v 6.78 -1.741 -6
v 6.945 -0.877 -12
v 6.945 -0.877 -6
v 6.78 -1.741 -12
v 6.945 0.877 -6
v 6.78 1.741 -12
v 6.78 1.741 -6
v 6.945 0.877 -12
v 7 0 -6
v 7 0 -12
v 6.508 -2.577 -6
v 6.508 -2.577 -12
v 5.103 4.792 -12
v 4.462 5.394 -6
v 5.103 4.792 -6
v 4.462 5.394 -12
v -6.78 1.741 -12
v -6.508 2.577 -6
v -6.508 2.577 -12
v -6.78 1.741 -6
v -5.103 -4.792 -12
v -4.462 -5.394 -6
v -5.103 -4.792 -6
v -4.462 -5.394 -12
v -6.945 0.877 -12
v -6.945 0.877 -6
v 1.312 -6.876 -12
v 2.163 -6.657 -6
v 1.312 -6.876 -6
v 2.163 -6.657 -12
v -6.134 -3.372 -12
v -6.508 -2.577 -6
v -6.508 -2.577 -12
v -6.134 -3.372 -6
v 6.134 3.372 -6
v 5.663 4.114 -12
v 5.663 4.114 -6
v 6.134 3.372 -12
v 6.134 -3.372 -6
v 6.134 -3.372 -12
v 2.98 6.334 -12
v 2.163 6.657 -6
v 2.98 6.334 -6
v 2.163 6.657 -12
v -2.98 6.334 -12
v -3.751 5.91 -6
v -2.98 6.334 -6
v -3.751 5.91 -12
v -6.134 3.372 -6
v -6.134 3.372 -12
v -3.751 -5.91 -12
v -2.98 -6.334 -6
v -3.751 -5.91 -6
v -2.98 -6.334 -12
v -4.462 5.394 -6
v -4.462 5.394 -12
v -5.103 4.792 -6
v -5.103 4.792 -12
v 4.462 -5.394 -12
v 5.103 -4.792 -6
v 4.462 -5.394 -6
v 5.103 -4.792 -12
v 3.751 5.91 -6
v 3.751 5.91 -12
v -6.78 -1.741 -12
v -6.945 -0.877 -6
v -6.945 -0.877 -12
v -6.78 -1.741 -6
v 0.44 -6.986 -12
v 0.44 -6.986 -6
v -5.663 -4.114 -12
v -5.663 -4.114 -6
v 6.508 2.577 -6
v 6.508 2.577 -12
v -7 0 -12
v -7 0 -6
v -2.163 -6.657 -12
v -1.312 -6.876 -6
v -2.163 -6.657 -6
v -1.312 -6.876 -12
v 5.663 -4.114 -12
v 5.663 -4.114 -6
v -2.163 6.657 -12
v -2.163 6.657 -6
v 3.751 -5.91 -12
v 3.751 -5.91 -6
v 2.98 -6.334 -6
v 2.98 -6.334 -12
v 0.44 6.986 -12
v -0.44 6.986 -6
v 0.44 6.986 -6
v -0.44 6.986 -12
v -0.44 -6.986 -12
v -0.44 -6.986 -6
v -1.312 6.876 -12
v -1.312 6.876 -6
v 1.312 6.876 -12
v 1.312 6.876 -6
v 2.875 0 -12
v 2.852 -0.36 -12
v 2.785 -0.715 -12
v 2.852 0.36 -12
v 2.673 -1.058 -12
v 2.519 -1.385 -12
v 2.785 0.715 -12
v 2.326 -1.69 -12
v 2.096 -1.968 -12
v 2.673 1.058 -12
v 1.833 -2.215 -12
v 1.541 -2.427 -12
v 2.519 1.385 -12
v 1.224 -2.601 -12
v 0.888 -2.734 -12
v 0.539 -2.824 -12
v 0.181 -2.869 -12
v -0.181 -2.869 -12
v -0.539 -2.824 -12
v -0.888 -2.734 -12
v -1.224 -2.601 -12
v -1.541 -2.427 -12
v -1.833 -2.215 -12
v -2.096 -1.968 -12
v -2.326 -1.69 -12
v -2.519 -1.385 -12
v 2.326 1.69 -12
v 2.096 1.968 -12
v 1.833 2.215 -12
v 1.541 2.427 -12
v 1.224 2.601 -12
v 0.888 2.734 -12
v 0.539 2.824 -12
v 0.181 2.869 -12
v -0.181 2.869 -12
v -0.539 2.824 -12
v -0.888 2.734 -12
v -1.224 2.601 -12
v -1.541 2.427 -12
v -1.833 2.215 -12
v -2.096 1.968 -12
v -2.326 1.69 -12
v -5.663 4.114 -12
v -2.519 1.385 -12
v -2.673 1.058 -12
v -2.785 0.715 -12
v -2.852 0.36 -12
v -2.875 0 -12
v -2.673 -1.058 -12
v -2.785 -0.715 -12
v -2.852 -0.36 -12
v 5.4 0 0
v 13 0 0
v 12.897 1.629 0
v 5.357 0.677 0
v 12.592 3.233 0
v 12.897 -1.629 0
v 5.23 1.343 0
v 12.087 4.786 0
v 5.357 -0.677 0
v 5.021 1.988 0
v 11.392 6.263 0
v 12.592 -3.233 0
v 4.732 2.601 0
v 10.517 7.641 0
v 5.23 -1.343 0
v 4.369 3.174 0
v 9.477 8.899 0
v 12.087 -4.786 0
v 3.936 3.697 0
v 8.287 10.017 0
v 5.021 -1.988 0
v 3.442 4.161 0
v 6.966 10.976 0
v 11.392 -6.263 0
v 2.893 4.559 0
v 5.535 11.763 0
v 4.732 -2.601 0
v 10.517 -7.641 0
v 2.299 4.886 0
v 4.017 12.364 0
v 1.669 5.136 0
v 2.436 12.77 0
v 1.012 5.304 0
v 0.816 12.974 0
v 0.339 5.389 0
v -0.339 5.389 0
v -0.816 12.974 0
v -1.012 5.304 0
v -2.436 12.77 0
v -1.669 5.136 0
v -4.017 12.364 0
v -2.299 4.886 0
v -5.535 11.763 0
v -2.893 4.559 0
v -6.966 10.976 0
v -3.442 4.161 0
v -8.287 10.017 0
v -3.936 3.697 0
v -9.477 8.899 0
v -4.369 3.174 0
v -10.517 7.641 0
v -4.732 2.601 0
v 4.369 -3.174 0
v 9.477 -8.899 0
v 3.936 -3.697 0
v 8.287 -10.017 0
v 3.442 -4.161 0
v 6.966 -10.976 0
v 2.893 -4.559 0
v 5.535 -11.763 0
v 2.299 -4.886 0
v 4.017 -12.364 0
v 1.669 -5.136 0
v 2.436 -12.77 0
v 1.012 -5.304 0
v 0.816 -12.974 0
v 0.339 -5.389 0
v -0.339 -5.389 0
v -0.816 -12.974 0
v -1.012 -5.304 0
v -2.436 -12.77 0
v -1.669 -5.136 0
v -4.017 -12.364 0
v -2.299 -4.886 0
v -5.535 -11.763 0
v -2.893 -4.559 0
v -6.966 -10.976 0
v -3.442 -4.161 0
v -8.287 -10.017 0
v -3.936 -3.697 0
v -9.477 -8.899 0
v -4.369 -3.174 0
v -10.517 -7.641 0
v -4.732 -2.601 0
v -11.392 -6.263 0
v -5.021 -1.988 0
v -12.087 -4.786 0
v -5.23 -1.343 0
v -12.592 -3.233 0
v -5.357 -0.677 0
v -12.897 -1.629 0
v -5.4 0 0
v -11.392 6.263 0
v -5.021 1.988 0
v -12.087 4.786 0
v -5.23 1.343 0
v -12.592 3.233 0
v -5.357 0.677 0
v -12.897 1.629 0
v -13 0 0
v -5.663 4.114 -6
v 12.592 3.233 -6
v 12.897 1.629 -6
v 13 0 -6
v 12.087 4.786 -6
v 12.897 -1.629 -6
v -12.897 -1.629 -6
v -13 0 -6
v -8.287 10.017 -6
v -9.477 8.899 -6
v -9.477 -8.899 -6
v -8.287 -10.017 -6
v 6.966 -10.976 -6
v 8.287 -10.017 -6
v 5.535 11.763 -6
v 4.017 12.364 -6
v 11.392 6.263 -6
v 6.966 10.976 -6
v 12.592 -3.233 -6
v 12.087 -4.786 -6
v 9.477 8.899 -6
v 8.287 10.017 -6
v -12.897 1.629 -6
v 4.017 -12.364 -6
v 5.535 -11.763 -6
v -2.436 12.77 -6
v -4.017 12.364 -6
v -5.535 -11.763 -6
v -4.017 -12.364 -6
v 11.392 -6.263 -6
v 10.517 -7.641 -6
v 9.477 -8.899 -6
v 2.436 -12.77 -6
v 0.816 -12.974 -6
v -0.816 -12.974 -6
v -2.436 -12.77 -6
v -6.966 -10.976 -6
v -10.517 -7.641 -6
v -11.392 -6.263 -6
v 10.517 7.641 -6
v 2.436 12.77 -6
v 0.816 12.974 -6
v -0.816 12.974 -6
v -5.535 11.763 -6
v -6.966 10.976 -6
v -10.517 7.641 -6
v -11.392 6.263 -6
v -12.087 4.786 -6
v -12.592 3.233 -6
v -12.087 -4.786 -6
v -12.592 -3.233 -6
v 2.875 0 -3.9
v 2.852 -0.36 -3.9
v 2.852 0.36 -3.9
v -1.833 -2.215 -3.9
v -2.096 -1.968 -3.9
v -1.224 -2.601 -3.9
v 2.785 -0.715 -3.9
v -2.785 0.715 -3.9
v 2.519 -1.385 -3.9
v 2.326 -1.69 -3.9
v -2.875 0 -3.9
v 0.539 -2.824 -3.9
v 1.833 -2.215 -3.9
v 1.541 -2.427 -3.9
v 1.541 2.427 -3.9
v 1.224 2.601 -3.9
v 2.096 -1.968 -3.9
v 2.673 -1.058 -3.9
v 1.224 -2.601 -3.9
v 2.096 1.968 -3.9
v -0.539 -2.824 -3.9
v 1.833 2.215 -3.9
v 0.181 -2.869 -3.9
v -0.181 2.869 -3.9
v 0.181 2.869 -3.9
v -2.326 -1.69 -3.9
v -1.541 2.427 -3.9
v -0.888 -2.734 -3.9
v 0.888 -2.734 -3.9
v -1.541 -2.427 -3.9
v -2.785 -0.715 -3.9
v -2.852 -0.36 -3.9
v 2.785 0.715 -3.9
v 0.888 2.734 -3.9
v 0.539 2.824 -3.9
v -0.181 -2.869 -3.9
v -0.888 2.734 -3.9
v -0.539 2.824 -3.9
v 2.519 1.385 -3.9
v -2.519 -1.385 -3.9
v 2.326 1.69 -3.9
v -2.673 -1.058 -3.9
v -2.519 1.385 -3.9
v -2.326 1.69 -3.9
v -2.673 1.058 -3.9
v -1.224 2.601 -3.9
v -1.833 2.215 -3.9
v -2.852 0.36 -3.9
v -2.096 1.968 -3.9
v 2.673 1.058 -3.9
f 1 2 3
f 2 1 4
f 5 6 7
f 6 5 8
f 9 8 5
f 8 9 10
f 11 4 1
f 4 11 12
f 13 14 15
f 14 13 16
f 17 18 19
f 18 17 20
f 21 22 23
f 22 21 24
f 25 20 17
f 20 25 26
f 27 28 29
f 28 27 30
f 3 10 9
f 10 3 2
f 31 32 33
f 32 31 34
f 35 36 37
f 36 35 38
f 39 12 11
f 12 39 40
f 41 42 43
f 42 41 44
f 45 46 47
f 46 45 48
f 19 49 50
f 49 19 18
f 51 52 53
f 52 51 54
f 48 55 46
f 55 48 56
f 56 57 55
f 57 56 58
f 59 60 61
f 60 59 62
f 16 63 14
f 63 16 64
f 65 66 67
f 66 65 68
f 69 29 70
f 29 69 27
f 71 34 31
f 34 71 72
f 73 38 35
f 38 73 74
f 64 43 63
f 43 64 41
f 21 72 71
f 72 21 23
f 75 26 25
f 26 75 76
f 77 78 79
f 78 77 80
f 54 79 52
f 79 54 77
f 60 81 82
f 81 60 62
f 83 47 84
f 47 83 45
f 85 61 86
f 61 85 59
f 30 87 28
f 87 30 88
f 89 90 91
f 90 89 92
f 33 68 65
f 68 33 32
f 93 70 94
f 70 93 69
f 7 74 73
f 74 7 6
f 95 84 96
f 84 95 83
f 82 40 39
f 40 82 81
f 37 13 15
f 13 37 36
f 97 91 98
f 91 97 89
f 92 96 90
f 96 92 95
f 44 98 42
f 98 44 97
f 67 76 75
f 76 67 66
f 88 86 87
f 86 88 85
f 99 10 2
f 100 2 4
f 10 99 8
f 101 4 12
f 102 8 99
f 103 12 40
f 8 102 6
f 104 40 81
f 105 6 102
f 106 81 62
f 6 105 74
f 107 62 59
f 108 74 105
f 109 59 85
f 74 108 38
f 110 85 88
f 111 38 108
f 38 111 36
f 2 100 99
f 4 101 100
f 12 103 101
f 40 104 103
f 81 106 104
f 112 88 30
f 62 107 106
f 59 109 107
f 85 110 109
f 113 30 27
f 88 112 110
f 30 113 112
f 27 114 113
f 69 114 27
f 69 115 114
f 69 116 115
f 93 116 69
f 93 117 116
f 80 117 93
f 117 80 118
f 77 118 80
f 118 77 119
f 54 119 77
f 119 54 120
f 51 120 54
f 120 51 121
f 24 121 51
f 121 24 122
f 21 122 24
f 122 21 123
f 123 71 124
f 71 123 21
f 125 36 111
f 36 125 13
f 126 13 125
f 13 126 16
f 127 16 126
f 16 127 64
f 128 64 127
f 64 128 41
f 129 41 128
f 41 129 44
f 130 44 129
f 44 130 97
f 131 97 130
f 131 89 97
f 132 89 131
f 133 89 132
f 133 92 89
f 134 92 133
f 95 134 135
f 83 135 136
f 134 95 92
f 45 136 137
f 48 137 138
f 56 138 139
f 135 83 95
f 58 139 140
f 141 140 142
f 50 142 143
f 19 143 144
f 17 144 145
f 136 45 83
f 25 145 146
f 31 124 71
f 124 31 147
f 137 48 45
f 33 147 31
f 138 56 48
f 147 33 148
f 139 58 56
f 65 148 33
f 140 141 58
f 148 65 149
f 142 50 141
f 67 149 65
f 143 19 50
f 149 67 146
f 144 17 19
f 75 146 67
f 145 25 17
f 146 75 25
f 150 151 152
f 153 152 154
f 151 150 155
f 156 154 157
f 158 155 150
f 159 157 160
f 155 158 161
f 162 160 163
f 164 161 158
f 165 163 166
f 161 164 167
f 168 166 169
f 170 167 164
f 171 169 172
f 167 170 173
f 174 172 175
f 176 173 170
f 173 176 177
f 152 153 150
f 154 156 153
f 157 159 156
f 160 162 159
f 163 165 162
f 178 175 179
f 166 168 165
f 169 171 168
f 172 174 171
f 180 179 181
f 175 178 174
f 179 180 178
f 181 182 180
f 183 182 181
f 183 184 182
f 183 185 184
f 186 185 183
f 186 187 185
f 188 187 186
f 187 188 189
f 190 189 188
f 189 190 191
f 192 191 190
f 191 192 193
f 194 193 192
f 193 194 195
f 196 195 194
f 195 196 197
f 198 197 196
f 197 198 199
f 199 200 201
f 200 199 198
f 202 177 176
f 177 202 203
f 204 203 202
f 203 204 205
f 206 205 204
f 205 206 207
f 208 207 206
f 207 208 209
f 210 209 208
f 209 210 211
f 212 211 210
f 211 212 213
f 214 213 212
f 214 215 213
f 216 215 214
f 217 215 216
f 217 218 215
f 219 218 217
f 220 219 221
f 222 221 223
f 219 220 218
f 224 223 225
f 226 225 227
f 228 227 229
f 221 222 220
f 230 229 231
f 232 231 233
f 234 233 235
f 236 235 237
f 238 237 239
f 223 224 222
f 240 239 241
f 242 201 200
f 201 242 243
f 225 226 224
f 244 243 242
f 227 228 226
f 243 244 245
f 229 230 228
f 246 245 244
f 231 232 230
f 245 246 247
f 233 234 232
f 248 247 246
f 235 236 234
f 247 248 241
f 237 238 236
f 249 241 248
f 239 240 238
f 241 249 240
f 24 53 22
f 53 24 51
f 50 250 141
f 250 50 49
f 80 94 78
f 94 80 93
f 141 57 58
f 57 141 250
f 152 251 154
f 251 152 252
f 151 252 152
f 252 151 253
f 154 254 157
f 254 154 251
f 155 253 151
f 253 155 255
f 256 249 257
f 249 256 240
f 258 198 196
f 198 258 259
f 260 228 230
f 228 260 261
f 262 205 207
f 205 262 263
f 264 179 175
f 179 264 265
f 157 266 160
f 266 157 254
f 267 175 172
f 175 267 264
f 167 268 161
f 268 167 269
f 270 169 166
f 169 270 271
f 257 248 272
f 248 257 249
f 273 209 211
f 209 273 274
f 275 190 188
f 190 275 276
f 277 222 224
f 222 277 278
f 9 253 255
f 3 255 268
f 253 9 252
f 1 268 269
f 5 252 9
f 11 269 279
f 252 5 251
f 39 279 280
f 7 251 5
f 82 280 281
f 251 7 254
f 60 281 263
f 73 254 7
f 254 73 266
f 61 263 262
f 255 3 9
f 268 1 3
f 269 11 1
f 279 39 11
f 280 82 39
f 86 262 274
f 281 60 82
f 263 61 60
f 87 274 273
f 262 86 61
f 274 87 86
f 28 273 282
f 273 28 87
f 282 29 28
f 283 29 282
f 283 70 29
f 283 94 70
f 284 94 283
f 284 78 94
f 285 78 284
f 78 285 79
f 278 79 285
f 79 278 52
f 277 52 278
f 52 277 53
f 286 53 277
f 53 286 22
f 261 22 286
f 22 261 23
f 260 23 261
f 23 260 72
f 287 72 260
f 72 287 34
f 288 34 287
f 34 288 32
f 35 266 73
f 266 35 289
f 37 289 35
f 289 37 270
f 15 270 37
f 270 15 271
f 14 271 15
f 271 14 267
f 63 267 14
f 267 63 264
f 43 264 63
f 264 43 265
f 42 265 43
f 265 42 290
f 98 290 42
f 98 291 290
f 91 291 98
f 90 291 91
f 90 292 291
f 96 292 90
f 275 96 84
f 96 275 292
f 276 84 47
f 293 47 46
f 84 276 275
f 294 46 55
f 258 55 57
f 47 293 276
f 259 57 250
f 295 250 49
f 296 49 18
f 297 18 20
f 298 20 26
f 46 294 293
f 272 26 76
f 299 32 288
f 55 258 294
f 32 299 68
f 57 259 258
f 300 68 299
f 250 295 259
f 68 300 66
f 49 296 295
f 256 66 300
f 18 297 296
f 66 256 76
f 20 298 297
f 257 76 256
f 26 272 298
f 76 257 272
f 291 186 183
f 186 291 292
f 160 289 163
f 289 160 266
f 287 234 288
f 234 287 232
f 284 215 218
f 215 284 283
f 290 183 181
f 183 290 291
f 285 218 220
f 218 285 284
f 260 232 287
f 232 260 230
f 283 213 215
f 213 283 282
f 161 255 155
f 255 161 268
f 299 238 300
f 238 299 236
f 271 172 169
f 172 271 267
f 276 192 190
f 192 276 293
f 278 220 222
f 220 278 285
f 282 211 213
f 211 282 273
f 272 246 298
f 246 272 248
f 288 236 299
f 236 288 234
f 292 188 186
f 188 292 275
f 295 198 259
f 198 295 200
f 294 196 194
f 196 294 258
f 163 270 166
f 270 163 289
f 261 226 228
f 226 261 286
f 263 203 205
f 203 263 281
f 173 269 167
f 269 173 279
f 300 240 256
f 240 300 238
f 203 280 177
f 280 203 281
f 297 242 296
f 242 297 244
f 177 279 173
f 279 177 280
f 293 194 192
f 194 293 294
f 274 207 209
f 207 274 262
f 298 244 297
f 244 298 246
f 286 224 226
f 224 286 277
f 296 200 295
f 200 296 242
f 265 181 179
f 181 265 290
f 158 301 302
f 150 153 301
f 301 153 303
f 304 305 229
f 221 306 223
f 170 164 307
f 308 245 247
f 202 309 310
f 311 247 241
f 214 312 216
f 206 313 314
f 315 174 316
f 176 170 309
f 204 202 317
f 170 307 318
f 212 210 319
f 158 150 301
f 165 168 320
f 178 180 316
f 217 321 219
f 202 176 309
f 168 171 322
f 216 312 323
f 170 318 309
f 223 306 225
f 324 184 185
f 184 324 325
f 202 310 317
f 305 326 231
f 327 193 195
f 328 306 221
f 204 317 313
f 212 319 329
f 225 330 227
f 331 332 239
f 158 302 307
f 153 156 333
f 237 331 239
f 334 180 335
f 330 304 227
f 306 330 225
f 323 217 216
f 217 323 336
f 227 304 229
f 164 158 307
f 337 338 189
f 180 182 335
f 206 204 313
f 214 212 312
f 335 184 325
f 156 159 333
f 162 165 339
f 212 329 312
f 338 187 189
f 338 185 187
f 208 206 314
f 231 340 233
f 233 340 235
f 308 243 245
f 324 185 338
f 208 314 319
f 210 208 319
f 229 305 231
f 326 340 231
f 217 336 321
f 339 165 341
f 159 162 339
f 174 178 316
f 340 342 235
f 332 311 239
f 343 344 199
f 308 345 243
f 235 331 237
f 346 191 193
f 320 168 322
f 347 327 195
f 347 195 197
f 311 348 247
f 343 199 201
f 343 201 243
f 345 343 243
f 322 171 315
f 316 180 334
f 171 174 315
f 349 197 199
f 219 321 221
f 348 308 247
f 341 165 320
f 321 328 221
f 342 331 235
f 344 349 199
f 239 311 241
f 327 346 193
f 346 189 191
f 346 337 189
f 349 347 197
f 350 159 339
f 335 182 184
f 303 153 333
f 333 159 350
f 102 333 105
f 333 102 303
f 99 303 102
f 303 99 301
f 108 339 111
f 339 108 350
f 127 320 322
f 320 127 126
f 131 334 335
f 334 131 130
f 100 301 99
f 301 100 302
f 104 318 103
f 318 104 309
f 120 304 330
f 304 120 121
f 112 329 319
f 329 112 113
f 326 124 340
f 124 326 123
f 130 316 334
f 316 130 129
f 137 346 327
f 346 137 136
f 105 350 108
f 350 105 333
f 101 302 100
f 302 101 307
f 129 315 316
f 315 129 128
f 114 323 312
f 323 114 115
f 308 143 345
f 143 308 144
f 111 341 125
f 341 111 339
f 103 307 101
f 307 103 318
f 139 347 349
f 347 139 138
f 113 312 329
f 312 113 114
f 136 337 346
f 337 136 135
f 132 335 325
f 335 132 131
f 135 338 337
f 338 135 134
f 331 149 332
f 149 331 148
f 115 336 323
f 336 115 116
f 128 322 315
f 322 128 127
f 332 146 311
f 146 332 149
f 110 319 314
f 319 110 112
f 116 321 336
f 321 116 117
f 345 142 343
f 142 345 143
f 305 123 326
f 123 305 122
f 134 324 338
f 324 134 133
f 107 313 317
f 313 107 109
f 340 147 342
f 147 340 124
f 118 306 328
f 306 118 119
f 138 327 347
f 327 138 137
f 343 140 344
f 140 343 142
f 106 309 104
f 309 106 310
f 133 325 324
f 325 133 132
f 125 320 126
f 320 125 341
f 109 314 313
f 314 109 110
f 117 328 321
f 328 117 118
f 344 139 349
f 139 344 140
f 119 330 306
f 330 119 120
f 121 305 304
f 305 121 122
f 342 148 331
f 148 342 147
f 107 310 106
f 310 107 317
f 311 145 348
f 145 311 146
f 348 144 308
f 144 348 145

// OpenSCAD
$fn = 50;


difference() {
	union() {
		translate(v = [0, 0, -12.0000000000]) {
			cylinder(h = 12, r = 7.0000000000);
		}
		translate(v = [0, 0, -6.0000000000]) {
			cylinder(h = 6, r = 13.0000000000);
		}
	}
	union() {
		translate(v = [0, 0, 0]) {
			rotate(a = [0, 0, 0]) {
				difference() {
					union() {
						#translate(v = [0, 0, -12.0000000000]) {
							cylinder(h = 12, r = 2.6000000000);
						}
						#translate(v = [0, 0, -3.9000000000]) {
							cylinder(h = 3.9000000000, r1 = 2.8750000000, r2 = 5.4000000000);
						}
						#translate(v = [0, 0, -12.0000000000]) {
							cylinder(h = 12, r = 2.8750000000);
						}
						#translate(v = [0, 0, -12.0000000000]) {
							cylinder(h = 12, r = 2.6000000000);
						}
					}
					union();
				}
			}
		}
	}
}
